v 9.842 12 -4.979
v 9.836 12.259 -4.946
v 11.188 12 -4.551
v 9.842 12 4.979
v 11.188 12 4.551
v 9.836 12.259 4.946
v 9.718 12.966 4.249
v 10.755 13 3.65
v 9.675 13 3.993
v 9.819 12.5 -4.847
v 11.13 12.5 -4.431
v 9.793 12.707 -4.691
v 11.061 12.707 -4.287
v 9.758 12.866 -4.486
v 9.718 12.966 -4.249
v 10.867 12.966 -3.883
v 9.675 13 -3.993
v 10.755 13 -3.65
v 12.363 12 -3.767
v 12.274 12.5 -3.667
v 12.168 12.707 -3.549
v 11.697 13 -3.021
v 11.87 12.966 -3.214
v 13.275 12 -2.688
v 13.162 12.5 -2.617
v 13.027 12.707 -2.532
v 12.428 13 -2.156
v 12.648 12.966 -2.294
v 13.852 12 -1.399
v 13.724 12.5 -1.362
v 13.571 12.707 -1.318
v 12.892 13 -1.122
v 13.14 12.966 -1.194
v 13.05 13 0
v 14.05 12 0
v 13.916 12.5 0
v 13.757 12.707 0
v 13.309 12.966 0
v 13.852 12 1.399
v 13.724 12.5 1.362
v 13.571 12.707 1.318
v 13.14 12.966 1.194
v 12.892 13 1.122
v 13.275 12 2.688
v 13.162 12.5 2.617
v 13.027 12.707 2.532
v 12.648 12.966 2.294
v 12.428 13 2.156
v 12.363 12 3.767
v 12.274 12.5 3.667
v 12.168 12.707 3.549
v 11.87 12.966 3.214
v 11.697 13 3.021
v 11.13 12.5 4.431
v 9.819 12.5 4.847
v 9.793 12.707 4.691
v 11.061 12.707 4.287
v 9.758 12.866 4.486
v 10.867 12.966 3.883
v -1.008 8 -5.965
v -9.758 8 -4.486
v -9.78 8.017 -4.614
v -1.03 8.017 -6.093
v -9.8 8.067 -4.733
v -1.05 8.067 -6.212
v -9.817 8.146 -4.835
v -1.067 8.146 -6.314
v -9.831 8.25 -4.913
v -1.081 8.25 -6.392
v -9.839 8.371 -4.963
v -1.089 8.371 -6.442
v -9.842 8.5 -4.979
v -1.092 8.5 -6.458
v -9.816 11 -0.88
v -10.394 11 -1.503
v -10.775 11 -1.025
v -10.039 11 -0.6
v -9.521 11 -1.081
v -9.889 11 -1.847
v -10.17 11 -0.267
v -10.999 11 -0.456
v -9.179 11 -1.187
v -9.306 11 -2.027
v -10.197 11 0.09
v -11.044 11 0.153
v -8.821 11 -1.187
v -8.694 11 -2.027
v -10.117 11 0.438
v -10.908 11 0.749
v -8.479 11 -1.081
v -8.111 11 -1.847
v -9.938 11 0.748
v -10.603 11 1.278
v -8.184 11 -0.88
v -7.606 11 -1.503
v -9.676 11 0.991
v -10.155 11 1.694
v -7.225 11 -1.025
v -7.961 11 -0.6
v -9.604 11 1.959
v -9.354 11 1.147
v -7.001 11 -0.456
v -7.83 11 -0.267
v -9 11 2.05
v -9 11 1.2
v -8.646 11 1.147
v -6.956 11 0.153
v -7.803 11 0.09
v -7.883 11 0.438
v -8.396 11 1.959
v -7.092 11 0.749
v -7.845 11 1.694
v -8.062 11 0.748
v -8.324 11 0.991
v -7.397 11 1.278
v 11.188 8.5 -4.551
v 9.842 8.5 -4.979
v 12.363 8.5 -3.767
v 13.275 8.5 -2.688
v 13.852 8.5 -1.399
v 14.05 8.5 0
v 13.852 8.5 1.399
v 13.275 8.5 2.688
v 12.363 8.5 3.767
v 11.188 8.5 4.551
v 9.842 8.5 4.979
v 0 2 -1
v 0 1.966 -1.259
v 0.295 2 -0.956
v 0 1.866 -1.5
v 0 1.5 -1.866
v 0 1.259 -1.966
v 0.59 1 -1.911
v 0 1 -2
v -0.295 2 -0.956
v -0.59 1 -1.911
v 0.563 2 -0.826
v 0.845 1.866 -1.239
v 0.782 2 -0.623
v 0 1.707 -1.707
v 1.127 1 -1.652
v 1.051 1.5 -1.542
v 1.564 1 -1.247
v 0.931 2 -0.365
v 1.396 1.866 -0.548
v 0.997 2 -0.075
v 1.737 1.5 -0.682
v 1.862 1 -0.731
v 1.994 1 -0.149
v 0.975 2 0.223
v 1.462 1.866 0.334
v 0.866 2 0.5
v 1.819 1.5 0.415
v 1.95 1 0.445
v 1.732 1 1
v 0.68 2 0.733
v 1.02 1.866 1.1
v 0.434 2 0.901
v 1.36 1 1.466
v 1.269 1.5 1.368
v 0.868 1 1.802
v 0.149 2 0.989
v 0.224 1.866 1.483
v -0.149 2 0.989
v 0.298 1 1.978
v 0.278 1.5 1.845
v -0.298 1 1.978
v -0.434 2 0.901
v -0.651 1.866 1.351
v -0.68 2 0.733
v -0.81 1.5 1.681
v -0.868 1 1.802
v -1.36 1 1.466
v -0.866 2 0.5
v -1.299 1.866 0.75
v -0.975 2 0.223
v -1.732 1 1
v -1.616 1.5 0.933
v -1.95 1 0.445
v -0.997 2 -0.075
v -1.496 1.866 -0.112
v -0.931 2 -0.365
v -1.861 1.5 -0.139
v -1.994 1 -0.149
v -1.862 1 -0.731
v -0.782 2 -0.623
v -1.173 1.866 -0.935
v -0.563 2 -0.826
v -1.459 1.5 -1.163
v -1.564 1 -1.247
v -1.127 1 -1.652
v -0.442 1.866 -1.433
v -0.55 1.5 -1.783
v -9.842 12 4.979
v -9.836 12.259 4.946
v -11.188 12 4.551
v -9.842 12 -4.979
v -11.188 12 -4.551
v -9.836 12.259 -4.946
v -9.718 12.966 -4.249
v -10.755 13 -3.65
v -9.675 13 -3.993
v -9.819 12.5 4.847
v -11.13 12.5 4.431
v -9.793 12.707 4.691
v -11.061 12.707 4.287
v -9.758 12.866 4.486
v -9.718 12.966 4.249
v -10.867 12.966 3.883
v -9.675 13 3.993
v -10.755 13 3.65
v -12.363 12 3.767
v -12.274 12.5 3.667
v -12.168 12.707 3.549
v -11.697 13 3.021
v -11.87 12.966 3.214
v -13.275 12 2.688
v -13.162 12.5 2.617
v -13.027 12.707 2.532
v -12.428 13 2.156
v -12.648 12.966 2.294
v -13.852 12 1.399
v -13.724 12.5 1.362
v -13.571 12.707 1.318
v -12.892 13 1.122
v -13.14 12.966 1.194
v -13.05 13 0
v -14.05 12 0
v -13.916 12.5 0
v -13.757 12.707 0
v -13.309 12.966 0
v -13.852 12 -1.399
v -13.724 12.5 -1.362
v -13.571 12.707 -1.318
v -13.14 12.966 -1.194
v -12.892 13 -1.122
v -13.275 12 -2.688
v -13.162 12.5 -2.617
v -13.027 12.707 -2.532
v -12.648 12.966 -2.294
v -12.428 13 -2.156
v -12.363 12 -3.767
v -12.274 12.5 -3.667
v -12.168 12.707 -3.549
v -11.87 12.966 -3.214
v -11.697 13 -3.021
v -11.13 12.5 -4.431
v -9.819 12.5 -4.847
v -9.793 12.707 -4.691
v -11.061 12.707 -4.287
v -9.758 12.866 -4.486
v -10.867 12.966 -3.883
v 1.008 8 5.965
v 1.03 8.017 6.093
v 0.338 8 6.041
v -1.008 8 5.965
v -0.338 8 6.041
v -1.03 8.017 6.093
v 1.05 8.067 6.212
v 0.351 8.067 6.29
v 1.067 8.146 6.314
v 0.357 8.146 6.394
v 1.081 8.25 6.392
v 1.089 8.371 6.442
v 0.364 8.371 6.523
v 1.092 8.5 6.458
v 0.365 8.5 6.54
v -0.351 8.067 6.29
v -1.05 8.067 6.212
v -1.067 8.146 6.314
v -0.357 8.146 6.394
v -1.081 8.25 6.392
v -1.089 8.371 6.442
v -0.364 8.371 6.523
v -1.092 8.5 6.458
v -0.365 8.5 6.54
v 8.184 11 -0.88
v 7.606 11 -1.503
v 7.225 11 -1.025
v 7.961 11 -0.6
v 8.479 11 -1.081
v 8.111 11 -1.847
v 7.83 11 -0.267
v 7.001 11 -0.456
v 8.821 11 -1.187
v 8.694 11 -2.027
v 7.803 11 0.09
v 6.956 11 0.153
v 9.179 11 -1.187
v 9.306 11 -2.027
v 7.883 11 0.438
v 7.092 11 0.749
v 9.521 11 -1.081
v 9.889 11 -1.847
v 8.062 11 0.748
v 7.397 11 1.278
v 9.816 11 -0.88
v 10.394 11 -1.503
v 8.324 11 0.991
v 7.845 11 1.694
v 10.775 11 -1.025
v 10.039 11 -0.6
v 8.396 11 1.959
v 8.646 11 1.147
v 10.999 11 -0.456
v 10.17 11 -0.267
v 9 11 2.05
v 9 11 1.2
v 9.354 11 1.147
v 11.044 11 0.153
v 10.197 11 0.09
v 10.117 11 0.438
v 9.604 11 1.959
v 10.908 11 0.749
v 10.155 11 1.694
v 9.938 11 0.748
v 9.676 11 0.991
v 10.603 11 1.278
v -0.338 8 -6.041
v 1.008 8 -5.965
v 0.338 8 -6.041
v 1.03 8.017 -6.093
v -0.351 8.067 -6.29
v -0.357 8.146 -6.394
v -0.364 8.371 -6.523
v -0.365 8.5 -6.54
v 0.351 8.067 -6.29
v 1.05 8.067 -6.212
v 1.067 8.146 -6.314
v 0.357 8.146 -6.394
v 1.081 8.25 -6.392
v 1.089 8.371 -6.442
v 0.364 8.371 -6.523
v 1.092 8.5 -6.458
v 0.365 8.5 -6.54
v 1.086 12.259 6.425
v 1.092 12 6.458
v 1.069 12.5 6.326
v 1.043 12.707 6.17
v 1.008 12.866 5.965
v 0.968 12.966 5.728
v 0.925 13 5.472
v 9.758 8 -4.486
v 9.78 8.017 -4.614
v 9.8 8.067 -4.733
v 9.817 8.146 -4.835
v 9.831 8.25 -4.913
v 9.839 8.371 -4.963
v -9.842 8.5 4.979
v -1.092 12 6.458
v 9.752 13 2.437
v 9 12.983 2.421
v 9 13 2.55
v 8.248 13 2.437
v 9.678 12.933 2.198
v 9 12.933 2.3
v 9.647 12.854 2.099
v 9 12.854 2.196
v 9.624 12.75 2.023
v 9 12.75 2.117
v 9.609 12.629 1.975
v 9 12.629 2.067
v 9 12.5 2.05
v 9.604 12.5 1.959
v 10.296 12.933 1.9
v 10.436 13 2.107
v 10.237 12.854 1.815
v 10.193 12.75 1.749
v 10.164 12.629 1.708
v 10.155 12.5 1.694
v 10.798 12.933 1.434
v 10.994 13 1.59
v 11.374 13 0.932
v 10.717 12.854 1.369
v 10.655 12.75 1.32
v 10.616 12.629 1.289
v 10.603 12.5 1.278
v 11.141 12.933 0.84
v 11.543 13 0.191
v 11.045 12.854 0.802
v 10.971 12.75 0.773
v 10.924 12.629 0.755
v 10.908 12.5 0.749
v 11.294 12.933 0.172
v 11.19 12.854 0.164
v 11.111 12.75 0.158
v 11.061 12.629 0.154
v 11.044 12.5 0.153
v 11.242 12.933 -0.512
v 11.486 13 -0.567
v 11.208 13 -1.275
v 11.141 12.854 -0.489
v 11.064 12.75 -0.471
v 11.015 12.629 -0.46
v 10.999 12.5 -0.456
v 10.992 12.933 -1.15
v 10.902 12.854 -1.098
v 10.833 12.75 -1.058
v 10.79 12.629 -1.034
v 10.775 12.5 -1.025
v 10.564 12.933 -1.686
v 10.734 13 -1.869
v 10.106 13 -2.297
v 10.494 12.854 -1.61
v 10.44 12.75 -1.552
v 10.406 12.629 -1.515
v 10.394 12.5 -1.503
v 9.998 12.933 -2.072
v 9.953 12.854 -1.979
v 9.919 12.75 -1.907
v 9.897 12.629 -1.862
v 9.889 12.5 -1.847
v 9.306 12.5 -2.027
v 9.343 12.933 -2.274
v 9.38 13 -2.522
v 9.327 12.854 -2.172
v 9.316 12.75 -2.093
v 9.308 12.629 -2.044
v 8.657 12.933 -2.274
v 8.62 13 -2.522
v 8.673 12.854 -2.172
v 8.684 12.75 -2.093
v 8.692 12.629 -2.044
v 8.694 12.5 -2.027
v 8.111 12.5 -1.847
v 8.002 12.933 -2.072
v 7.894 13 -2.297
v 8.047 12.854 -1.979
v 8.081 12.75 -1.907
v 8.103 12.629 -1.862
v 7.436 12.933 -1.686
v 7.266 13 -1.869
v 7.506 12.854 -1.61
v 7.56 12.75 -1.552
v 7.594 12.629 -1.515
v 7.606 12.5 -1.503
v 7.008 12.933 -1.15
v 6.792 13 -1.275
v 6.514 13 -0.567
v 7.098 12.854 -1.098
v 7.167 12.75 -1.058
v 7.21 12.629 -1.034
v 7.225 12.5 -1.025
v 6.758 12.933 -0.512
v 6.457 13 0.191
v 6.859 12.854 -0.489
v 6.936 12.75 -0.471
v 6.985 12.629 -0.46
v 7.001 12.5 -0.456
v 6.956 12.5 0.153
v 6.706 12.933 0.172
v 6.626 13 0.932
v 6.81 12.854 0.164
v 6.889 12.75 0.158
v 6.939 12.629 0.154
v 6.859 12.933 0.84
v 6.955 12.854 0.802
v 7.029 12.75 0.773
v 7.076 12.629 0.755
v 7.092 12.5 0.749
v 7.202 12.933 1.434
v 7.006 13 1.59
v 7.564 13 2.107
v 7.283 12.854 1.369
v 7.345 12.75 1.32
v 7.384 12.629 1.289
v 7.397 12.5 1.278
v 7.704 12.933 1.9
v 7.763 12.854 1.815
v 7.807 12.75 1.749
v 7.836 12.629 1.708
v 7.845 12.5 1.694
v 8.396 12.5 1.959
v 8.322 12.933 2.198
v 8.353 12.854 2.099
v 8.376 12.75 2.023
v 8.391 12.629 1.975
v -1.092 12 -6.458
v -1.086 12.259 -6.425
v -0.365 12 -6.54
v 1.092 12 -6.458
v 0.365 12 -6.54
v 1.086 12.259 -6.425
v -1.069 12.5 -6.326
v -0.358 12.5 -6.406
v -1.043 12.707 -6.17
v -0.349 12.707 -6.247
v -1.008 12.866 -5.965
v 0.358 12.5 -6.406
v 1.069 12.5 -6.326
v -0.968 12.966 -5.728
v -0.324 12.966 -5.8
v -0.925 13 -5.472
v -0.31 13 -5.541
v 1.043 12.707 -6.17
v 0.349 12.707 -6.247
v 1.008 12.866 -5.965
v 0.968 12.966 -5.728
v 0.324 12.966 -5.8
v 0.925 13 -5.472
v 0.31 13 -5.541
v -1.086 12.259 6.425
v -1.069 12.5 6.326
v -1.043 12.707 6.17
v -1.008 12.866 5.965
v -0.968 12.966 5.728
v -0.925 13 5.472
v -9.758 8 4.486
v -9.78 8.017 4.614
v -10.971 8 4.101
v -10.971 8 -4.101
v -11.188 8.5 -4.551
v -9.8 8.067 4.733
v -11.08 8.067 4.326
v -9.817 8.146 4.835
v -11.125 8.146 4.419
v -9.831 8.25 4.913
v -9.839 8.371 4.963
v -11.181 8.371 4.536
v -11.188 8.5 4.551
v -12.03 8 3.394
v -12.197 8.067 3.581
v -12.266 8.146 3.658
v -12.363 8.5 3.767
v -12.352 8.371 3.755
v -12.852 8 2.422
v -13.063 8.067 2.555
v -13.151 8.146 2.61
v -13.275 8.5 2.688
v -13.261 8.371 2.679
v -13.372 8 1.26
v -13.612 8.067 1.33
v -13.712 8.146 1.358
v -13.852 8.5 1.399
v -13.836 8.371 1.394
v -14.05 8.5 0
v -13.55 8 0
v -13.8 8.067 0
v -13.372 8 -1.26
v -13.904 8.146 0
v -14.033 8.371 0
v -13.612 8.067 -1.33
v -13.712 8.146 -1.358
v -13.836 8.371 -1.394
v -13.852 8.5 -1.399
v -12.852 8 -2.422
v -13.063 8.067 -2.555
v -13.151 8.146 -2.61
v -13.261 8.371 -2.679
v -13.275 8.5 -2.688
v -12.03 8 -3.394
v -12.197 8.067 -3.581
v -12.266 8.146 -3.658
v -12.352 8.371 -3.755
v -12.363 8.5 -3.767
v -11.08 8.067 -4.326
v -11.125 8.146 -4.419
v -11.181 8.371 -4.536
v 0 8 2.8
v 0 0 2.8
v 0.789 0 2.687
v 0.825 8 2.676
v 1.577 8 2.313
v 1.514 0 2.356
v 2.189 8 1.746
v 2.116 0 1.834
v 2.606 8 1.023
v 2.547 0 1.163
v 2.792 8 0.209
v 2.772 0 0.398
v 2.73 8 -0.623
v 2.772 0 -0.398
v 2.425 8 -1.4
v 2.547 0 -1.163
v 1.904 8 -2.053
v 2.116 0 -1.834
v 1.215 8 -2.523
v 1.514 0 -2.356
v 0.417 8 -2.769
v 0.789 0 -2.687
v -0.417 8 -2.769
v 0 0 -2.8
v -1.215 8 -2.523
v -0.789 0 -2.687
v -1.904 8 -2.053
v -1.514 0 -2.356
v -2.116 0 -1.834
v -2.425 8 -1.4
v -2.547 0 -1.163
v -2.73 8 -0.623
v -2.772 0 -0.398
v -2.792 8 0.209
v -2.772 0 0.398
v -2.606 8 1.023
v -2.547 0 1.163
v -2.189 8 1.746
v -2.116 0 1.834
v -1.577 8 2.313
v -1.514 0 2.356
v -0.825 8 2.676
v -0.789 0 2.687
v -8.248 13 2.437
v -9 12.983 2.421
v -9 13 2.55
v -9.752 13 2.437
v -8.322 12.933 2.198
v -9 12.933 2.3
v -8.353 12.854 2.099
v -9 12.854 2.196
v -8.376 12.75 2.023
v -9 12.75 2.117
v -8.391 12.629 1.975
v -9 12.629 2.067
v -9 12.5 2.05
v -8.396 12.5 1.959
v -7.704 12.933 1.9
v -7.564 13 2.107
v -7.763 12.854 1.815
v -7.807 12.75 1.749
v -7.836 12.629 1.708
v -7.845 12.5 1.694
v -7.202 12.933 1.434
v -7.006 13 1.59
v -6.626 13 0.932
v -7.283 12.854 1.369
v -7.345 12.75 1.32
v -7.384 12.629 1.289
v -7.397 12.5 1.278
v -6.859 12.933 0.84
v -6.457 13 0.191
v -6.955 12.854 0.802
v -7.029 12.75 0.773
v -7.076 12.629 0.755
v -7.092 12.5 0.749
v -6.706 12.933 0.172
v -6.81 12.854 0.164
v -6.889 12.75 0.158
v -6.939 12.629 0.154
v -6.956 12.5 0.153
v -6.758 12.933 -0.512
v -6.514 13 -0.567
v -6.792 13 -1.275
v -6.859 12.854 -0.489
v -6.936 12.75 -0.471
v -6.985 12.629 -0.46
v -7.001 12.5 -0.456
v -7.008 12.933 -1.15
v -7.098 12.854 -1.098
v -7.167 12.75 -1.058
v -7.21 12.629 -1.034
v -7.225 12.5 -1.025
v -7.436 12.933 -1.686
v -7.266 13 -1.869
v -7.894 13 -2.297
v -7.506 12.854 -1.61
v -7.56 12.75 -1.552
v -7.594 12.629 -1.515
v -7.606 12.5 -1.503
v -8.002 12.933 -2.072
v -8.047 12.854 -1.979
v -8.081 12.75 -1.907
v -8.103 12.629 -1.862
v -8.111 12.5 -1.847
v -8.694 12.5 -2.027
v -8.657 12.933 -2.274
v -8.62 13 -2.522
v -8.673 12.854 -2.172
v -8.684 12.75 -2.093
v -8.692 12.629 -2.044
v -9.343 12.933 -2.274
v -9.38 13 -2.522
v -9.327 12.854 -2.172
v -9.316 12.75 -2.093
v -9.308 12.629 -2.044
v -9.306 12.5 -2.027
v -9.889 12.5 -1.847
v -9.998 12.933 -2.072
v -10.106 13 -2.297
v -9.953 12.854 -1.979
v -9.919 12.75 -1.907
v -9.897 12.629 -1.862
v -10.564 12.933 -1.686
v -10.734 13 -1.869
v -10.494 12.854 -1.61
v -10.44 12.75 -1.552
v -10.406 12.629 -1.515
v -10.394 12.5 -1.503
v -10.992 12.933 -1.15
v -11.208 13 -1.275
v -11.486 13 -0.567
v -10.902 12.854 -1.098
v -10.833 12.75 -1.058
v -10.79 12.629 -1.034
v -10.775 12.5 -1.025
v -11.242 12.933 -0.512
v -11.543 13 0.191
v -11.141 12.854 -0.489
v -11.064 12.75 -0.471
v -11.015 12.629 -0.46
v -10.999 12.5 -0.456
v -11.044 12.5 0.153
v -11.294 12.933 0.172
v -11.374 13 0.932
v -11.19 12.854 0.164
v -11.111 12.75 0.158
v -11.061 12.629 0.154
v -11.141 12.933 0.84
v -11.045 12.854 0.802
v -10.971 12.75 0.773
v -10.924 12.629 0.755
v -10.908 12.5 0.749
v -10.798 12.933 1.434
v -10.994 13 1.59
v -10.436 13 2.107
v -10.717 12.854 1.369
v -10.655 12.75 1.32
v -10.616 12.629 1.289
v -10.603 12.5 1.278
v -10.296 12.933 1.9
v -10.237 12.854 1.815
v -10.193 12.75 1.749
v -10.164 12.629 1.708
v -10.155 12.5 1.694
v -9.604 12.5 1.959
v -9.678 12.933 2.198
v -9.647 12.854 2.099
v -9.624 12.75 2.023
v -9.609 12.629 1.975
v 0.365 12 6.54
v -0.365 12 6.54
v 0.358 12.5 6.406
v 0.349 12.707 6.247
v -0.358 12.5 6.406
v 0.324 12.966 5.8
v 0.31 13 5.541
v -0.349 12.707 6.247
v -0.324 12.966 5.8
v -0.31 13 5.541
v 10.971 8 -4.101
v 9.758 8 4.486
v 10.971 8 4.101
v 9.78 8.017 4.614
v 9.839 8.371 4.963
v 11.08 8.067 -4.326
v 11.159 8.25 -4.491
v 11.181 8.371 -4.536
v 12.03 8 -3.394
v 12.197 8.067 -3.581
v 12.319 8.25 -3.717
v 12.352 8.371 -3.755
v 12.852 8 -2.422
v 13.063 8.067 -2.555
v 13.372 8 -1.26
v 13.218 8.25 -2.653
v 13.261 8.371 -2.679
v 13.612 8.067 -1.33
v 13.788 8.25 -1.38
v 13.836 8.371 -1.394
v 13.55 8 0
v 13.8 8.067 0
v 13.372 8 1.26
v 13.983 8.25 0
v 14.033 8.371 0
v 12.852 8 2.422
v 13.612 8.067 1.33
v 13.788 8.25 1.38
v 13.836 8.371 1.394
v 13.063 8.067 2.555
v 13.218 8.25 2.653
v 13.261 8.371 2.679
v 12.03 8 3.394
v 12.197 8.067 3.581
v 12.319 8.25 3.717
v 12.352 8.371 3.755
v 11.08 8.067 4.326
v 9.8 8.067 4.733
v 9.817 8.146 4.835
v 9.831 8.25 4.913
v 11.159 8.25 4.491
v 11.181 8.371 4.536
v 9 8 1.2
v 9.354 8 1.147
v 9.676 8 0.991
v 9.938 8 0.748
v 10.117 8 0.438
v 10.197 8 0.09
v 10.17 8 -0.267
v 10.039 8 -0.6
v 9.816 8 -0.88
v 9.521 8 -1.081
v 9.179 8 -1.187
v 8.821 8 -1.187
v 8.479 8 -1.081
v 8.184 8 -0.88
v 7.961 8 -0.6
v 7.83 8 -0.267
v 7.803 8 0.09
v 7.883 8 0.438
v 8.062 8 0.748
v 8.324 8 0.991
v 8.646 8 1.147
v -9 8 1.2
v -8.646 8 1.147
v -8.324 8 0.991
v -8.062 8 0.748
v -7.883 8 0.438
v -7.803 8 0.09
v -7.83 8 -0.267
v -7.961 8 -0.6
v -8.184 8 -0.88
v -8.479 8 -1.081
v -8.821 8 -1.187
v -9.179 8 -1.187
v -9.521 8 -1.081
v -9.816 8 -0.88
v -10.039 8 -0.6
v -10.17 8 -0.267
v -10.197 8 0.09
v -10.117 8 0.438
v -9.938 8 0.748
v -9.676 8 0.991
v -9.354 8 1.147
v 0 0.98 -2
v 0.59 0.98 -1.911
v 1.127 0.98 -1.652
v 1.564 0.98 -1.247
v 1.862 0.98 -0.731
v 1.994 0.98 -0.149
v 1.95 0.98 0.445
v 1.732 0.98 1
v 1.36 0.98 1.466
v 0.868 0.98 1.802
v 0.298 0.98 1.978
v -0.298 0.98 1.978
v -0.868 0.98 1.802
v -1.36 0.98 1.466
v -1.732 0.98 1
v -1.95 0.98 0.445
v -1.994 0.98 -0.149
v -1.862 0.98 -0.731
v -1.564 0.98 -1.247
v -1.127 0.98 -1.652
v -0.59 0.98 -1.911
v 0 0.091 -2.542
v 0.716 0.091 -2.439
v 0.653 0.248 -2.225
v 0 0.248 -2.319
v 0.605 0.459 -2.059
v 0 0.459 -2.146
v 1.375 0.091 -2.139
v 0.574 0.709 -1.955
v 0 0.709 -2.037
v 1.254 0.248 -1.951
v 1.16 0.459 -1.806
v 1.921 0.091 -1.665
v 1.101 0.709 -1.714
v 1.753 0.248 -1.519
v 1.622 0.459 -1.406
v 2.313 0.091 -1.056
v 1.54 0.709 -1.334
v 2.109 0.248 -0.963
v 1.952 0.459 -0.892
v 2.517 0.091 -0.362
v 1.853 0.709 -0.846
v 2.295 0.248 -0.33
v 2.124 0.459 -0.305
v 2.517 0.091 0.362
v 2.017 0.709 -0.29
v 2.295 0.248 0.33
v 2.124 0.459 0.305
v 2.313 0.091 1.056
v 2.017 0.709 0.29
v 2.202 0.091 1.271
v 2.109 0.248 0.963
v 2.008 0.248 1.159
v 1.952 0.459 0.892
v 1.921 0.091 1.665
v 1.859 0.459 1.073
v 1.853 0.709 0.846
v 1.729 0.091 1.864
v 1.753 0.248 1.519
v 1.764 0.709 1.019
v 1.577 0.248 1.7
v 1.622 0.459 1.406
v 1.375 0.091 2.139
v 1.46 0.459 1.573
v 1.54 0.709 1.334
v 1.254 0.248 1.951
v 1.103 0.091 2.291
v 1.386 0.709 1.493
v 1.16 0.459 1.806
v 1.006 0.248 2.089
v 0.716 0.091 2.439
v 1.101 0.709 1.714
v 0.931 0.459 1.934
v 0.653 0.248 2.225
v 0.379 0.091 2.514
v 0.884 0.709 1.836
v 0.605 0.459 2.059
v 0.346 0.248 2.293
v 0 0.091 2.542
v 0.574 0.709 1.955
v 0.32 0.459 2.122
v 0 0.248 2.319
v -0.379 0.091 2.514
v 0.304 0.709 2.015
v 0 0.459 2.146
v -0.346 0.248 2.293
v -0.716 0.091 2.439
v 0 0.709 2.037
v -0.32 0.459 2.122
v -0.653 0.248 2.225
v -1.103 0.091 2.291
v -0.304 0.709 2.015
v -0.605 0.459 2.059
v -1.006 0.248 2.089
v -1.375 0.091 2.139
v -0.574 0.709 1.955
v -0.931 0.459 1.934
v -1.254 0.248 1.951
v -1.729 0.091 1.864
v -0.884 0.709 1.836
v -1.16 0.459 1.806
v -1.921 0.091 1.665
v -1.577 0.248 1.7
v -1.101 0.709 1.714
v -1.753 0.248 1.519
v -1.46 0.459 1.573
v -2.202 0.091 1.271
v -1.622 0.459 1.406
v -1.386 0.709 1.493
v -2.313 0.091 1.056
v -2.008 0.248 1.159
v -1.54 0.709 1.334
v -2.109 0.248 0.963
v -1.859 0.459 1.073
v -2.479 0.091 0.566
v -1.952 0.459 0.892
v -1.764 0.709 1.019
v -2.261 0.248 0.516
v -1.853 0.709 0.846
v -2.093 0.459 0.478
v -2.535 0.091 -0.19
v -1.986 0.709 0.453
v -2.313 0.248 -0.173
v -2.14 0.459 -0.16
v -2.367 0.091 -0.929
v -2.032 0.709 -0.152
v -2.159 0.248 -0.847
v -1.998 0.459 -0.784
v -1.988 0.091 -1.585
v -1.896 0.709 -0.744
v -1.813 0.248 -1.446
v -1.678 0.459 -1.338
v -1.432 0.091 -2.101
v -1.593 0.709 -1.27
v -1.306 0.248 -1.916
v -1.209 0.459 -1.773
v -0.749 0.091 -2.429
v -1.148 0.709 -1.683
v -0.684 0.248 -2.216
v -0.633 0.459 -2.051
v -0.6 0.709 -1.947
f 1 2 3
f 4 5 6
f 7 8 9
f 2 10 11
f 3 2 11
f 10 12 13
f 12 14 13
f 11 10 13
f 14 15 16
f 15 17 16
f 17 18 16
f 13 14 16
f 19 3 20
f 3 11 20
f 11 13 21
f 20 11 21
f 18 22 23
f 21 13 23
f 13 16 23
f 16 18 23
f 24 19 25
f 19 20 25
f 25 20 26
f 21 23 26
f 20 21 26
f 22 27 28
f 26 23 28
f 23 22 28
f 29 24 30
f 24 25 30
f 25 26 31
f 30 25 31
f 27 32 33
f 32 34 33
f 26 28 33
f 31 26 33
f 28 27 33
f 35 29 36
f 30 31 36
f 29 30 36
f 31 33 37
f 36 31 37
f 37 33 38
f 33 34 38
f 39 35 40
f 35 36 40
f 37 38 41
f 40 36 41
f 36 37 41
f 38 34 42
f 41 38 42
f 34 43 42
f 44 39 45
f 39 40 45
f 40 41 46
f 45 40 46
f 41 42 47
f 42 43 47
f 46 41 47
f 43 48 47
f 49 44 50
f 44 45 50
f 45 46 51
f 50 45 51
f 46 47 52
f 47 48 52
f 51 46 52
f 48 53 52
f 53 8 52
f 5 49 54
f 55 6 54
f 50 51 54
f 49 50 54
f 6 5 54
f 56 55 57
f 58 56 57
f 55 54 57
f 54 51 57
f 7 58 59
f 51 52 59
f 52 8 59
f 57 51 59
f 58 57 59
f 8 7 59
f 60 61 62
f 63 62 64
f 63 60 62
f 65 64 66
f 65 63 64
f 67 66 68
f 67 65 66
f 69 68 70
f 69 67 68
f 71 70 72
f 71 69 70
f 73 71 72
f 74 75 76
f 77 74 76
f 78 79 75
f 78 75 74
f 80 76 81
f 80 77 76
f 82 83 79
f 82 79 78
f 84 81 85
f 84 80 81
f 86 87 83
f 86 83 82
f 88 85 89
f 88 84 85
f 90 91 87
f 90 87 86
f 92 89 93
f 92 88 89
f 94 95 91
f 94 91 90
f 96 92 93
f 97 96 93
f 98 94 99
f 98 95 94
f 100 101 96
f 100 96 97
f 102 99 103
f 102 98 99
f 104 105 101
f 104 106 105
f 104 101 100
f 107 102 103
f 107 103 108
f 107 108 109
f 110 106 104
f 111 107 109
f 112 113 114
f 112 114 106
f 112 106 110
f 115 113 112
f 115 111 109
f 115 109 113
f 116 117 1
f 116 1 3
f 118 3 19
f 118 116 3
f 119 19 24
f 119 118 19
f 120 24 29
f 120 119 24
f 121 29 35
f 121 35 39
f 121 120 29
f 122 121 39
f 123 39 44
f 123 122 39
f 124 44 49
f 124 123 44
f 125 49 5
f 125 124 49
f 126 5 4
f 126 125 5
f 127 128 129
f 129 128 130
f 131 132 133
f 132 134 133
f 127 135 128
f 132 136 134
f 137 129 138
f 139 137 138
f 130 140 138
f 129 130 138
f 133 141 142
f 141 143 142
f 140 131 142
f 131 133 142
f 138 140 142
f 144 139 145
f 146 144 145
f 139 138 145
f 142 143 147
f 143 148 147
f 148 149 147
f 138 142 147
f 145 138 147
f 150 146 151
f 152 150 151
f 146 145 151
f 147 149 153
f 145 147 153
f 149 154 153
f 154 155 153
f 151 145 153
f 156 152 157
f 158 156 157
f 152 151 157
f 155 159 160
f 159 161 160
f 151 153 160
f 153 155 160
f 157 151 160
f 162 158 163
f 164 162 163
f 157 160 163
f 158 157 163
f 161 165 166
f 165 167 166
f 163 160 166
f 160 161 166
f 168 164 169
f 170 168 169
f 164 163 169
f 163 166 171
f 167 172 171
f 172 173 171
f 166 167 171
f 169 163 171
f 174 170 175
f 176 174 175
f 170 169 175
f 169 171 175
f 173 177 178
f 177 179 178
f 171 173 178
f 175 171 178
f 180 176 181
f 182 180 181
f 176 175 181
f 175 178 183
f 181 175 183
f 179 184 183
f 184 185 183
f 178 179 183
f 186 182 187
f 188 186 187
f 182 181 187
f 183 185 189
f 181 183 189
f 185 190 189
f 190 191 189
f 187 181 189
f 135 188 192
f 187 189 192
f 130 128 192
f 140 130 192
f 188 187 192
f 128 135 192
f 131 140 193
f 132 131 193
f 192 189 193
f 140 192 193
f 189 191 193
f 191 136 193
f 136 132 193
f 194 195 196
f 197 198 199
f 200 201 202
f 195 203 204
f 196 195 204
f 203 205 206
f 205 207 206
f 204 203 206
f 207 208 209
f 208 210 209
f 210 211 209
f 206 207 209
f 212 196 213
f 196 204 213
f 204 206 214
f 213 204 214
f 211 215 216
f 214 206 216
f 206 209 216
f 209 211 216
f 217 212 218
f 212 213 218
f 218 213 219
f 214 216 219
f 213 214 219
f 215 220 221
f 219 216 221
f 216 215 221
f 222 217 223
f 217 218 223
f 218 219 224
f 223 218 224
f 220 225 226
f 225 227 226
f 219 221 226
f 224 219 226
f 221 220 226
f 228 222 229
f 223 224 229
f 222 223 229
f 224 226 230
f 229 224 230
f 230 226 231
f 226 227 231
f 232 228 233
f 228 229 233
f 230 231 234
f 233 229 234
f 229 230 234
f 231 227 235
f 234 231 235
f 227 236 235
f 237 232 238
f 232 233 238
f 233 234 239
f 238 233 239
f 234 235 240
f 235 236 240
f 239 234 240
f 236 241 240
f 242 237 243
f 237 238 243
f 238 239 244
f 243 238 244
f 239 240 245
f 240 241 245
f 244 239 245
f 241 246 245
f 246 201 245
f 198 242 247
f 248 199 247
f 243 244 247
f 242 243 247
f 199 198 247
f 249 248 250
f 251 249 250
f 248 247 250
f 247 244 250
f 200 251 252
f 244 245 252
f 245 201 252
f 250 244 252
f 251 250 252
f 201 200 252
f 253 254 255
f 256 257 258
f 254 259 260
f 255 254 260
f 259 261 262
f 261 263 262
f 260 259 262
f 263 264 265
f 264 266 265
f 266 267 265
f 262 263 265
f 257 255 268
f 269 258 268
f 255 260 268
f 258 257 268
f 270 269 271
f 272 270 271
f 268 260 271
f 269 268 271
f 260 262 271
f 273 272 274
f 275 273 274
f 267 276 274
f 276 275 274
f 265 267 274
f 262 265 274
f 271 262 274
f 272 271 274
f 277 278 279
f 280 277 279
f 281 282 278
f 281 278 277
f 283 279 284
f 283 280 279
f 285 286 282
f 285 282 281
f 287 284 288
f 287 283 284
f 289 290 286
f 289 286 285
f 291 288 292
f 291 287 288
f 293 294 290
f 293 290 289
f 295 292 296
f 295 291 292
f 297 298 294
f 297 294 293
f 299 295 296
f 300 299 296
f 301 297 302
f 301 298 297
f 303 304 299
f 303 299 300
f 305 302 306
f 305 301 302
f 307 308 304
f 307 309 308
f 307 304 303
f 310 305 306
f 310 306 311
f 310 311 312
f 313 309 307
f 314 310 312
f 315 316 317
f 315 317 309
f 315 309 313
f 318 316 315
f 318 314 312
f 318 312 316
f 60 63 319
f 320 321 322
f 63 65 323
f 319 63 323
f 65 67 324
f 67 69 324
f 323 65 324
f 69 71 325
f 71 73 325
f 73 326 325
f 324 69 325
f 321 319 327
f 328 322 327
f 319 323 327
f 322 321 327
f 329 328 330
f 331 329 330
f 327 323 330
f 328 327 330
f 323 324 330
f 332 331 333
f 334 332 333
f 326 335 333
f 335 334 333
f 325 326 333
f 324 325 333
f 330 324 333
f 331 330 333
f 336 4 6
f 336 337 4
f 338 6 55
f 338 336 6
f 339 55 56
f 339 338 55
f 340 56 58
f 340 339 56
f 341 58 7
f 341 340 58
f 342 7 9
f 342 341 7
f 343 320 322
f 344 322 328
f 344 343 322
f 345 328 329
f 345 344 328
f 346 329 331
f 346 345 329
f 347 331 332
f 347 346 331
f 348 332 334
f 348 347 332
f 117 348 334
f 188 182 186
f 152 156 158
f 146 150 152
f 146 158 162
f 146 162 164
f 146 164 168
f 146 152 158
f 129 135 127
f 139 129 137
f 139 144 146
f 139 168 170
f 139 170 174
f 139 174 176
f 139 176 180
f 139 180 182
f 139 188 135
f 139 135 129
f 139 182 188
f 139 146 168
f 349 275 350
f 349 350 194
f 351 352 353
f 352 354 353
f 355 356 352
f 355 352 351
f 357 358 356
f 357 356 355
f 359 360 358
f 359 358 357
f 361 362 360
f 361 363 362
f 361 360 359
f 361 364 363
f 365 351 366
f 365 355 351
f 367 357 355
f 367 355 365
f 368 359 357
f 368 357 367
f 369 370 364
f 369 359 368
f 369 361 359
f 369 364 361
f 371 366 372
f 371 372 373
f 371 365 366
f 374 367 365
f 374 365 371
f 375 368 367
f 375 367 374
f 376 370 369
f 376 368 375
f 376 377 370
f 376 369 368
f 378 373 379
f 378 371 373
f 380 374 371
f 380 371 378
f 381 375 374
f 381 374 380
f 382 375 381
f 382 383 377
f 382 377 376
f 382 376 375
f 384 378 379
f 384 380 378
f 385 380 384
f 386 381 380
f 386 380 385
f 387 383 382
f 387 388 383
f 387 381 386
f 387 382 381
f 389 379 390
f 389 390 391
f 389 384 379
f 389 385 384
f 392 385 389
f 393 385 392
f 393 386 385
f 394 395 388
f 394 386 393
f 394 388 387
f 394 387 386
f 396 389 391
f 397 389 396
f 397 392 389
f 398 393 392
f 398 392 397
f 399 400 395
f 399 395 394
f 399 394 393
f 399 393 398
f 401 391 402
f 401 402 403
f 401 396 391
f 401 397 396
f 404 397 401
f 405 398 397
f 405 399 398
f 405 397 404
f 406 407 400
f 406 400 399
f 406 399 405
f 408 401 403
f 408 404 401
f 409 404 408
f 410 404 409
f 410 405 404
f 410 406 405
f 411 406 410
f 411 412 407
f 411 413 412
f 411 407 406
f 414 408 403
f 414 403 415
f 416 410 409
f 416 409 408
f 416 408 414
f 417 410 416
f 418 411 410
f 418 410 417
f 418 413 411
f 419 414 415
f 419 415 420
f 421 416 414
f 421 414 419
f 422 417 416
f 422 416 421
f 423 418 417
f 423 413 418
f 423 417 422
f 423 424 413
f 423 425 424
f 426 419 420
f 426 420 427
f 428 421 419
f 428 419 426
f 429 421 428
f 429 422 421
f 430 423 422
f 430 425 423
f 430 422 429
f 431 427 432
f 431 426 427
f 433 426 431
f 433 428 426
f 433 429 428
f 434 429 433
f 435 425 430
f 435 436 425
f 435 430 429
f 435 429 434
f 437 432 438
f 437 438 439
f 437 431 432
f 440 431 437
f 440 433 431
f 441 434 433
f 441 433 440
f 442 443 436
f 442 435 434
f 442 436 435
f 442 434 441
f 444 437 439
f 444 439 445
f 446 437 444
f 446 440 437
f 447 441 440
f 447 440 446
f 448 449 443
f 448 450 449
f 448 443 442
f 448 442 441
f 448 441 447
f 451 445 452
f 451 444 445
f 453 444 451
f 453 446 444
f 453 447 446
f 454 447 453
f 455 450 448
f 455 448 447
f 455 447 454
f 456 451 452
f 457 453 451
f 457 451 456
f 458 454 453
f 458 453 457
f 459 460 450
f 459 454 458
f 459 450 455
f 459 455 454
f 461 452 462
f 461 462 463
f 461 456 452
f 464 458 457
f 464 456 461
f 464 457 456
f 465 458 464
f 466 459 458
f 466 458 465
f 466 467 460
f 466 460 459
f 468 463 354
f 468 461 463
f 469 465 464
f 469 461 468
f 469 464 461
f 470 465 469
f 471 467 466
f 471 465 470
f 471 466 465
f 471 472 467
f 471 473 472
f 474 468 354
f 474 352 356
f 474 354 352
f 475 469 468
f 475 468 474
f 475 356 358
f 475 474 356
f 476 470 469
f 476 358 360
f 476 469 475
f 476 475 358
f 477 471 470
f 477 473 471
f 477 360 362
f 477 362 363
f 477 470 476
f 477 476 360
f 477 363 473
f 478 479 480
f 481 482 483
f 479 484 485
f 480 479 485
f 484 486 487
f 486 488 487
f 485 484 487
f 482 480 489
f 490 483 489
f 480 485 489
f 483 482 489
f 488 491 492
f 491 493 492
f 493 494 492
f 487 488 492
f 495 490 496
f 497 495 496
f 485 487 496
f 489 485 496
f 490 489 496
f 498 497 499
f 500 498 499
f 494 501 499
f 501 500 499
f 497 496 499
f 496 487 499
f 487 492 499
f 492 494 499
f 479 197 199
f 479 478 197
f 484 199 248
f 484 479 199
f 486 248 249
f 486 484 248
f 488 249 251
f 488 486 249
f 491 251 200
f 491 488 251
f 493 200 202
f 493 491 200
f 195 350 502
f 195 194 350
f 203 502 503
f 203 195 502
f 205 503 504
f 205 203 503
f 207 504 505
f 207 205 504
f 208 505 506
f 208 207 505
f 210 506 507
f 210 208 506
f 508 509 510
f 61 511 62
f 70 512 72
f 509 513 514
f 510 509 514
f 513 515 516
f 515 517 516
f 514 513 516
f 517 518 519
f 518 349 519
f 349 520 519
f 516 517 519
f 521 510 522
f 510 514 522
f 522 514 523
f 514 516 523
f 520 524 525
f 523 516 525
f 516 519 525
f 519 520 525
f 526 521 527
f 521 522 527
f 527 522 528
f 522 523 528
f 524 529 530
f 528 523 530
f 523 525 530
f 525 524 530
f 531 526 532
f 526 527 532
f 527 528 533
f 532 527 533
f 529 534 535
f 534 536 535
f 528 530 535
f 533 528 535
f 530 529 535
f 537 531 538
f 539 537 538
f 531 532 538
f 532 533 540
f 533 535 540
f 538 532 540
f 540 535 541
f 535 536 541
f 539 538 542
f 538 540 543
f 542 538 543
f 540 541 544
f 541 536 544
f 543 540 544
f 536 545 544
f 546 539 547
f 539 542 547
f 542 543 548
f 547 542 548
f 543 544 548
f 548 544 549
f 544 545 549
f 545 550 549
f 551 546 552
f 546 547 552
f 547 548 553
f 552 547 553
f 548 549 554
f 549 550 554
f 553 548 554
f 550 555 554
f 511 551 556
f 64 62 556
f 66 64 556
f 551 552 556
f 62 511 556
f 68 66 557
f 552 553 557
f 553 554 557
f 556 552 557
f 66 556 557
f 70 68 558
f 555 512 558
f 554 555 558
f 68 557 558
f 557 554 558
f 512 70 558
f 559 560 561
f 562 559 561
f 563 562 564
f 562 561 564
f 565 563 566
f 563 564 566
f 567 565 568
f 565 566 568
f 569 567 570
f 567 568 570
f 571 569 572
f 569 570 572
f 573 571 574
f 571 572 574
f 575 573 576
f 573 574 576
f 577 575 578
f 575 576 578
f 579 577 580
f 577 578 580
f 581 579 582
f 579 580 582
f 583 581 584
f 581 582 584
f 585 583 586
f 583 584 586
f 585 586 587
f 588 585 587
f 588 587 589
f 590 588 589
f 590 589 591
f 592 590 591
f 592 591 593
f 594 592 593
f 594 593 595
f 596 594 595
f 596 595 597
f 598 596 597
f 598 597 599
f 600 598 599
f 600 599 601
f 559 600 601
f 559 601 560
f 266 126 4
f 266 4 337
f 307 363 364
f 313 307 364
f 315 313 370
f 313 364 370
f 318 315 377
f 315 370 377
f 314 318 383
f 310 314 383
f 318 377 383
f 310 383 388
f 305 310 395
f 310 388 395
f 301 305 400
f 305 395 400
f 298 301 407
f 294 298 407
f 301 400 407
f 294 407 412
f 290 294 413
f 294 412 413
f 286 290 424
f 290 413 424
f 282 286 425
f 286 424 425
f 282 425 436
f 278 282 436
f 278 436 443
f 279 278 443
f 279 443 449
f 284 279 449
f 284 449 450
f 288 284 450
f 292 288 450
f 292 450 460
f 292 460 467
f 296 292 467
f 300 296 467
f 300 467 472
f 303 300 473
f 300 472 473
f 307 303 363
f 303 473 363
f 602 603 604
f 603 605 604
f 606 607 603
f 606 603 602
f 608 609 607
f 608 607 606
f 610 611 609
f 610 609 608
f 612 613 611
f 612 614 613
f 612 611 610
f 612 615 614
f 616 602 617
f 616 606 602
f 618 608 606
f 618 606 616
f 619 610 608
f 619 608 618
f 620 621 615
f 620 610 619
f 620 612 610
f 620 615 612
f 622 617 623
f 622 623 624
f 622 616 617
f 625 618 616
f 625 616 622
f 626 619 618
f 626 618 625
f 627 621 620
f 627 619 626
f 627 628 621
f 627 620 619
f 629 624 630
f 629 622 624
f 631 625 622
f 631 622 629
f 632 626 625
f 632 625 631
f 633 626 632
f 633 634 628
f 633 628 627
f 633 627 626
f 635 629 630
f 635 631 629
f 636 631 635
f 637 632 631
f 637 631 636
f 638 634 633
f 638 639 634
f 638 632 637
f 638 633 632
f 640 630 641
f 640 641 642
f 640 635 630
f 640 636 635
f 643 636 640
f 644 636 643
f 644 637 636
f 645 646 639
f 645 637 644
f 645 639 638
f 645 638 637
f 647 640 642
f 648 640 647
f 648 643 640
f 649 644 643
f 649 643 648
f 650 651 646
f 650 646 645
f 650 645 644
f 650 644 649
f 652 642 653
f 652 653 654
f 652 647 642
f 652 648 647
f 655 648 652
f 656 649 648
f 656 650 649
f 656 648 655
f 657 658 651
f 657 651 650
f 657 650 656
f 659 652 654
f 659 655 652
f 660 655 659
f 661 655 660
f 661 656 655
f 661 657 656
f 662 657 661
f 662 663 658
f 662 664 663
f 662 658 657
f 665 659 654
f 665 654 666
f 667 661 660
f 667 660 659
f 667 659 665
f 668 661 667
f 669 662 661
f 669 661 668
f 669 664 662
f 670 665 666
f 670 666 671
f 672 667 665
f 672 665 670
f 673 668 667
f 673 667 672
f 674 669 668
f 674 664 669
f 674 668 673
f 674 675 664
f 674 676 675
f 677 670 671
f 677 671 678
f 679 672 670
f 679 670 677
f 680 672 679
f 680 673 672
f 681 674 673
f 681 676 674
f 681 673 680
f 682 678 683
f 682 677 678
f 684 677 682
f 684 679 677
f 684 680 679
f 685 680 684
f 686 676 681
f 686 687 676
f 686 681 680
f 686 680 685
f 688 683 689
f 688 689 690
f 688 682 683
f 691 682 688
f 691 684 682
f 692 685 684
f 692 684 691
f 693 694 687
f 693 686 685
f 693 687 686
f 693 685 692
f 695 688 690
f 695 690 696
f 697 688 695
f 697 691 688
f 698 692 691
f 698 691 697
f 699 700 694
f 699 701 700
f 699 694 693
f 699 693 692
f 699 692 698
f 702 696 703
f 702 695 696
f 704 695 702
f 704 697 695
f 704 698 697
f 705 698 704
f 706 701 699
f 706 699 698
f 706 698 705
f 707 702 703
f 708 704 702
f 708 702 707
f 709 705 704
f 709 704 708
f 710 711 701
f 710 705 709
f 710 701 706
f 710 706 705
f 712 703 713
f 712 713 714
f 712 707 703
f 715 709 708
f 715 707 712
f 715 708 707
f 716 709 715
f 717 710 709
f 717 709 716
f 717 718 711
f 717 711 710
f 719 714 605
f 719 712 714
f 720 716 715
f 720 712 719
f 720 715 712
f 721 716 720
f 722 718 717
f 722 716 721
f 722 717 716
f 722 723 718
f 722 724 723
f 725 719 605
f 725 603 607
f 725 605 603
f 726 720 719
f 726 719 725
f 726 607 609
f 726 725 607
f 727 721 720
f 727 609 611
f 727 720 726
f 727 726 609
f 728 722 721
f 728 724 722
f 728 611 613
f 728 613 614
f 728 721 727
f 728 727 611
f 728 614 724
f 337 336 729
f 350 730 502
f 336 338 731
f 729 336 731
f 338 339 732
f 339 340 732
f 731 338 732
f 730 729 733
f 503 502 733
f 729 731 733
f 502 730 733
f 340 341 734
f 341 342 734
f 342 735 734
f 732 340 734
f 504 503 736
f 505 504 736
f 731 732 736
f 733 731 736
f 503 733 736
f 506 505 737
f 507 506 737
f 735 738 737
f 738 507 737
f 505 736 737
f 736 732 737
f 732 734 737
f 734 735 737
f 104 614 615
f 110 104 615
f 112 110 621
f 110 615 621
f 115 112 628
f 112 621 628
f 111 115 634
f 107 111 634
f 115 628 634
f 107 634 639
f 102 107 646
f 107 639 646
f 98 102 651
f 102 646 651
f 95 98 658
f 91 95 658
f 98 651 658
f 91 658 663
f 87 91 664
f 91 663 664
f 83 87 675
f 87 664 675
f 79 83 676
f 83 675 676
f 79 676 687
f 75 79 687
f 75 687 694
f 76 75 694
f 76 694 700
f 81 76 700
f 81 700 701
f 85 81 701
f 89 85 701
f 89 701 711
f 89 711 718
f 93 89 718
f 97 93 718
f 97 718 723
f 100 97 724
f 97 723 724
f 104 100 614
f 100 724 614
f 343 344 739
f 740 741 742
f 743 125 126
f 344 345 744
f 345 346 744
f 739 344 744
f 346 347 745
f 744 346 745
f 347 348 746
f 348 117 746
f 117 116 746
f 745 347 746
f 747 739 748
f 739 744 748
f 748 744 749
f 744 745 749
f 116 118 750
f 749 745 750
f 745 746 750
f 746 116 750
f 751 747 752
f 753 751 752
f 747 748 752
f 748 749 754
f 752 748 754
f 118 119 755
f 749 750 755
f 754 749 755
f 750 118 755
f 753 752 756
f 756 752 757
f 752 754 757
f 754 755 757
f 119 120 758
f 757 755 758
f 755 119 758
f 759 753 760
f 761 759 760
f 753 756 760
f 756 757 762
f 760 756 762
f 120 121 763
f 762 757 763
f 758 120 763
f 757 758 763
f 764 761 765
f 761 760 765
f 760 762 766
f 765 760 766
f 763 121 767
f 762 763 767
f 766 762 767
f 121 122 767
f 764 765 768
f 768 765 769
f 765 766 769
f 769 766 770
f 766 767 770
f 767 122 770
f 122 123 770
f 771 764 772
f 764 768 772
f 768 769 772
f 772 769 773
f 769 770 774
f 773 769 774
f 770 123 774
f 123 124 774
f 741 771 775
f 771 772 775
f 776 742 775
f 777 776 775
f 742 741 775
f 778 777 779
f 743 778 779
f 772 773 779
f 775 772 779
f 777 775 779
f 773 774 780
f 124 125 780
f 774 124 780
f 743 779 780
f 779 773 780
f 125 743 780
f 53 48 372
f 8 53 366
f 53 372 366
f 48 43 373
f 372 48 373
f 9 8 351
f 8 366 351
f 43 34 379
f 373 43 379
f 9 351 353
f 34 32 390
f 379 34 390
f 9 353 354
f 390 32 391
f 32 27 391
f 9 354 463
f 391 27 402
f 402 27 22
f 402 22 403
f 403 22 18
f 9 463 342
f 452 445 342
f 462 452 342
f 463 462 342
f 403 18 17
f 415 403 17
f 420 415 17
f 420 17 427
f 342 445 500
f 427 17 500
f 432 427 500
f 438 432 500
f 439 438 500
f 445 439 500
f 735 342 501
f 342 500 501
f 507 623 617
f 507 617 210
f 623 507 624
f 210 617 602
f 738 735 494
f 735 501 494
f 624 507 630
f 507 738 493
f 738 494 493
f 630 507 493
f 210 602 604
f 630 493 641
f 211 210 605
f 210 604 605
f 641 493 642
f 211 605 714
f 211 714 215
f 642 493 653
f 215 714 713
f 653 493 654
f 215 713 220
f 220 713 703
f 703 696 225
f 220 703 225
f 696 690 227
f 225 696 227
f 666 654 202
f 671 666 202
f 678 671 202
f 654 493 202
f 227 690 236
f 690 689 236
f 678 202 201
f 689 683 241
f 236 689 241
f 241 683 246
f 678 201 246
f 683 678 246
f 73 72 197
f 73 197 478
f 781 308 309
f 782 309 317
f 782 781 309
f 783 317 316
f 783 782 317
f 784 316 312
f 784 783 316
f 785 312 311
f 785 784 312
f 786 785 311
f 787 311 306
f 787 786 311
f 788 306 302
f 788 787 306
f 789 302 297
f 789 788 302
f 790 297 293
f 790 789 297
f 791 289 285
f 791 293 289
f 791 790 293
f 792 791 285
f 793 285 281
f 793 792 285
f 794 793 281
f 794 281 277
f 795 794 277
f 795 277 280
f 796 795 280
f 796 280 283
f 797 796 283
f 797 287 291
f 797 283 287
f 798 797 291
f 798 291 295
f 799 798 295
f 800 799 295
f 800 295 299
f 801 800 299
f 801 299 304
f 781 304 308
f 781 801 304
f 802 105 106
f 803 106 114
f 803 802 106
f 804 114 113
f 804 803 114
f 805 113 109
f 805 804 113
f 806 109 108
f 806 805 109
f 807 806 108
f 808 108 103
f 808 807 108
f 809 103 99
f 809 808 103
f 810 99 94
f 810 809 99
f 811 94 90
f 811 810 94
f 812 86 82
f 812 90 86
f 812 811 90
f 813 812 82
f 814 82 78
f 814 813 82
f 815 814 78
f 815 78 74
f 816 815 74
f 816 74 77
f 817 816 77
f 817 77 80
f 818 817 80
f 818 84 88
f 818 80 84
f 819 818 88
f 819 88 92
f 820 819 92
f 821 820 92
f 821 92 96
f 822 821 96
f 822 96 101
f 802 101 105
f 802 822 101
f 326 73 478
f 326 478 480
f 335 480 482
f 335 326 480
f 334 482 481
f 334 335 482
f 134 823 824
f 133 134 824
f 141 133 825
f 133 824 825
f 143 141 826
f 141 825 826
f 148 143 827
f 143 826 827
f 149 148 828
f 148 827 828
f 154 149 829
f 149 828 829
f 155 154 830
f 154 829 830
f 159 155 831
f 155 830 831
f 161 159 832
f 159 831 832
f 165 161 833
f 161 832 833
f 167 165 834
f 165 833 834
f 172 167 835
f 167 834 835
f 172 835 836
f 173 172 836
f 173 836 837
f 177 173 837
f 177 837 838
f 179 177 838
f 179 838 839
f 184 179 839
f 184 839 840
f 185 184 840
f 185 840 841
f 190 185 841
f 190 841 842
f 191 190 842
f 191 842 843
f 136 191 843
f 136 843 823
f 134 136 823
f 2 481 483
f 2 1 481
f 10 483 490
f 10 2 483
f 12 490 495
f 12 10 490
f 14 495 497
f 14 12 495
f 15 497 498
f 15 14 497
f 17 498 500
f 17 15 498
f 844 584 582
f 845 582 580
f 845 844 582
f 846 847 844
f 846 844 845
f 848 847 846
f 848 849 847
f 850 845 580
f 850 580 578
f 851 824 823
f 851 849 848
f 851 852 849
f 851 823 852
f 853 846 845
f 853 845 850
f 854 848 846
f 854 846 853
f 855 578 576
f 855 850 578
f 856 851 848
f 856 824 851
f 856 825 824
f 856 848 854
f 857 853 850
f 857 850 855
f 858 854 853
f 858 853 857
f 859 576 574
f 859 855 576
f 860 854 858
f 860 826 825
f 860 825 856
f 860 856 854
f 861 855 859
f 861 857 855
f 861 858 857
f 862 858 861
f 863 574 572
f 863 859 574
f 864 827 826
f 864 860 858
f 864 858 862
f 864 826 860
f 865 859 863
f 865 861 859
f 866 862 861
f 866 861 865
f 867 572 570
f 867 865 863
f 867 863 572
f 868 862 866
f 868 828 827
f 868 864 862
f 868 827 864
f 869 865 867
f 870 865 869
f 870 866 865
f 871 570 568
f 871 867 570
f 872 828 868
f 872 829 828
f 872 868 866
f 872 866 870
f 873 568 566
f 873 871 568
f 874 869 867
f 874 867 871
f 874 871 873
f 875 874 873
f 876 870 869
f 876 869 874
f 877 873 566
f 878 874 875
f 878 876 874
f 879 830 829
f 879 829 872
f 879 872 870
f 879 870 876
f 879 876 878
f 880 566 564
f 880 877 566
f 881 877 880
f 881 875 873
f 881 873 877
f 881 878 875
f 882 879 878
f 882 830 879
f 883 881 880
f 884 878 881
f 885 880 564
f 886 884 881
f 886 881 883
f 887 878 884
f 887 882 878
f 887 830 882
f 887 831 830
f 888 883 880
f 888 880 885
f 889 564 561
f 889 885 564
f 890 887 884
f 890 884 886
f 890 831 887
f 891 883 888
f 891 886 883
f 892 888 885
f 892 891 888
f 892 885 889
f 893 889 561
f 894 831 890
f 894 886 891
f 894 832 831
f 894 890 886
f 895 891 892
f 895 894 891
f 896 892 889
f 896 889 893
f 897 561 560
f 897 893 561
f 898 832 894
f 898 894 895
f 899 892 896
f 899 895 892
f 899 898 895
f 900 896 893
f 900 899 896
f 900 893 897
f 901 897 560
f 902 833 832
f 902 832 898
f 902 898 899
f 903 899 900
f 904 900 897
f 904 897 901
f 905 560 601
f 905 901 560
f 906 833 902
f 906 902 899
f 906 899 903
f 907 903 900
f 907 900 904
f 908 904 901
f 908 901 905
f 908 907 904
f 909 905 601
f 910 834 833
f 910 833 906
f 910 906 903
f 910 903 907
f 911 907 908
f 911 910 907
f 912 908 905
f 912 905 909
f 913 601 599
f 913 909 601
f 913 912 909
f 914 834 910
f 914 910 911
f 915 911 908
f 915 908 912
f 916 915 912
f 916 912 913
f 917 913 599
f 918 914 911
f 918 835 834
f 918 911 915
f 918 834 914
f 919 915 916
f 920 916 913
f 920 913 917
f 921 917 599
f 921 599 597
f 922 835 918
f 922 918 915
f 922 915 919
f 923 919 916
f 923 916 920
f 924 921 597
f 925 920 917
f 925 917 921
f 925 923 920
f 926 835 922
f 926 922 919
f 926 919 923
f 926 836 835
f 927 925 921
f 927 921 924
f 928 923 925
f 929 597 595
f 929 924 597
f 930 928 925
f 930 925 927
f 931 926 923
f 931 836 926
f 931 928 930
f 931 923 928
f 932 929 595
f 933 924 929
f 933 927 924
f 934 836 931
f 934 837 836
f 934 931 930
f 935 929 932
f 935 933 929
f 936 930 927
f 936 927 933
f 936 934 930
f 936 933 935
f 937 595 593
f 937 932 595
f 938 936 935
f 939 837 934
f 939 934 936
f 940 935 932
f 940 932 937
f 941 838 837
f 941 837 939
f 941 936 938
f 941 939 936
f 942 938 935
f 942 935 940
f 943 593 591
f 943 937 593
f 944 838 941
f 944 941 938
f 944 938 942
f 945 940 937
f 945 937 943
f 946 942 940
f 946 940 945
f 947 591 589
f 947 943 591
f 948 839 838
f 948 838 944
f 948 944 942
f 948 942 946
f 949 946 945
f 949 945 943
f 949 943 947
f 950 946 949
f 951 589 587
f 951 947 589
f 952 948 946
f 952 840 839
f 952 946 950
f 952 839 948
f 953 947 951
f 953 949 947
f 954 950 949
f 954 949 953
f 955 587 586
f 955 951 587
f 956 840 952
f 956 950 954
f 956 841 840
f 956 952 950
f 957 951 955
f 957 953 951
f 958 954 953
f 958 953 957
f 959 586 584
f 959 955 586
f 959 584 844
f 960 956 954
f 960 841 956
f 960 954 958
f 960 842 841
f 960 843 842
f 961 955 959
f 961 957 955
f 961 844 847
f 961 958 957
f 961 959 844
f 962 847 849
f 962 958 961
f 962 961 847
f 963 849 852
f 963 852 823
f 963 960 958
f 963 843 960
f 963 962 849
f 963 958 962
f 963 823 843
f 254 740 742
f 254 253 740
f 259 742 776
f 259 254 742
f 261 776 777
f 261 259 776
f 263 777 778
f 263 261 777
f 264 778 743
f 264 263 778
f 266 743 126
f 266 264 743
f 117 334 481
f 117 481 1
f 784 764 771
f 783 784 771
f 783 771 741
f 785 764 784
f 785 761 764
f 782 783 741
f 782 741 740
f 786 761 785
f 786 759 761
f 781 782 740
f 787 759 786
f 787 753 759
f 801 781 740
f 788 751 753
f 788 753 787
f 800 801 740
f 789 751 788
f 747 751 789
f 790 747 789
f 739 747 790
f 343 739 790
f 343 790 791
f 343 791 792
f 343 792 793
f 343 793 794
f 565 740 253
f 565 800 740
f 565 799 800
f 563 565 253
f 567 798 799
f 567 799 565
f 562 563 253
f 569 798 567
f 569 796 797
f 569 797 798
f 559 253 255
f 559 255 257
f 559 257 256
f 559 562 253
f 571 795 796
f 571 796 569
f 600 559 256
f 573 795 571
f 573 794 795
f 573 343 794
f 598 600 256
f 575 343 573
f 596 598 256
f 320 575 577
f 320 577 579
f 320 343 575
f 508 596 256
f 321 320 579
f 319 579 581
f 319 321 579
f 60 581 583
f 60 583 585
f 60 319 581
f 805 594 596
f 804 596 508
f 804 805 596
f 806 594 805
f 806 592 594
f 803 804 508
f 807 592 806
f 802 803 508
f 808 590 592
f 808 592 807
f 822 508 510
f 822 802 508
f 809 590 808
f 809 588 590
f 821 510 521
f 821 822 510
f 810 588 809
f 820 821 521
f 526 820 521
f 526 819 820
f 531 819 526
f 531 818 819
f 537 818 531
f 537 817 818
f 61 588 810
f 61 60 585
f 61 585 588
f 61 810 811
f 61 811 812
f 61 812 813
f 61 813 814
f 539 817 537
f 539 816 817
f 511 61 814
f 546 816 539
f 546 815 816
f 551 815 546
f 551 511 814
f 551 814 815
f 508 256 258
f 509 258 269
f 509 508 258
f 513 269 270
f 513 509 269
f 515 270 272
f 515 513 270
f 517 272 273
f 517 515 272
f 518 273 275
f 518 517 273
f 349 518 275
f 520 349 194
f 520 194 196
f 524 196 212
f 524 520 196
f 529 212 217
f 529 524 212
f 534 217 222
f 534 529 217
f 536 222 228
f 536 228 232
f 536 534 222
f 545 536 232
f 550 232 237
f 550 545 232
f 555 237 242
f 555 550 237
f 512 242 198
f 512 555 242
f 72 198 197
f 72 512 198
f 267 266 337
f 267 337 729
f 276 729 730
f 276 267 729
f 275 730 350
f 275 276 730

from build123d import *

# Parameters (mm, degrees)
SKETCH1_R           = 2.8
BOSS_EXTRUDE1_DEPTH = 8
SKETCH2_R           = 1.2
BOSS_EXTRUDE2_DEPTH = 5
SKETCH3_R           = 2.05
CUT_EXTRUDE1_DEPTH  = 2
FILLET1_R           = 0.5
FILLET2_R           = 1
SKETCH5_R           = 2
CUT_EXTRUDE2_DEPTH  = 2
FILLET3_R           = 1


with BuildPart() as part:
    # Sketch1 → Boss-Extrude1 (new body)
    with BuildSketch(Plane(origin=(0, 0, 0), x_dir=(1, 0, 0), z_dir=(0, 1, 0))):
        with Locations(Location((0, 0, 0), (0, 0, 270))):
            Circle(SKETCH1_R)
    extrude(amount=BOSS_EXTRUDE1_DEPTH)

    # Sketch2 → Boss-Extrude2 (add)
    with BuildSketch(Plane(origin=(0, 8, 0), x_dir=(1, 0, 0), z_dir=(0, 1, 0))):
        with BuildLine():
            Line((-9.841666667, 4.979367151), (-1.091666667, 6.458387097))
            ThreePointArc((-1.091666667, 6.458387097), (0, 6.55), (1.091666667, 6.458387097))
            Line((1.091666667, 6.458387097), (9.841666667, 4.979367151))
            ThreePointArc((9.841666667, 4.979367151), (14.05, 0), (9.841666667, -4.979367151))
            Line((9.841666667, -4.979367151), (1.091666667, -6.458387097))
            ThreePointArc((1.091666667, -6.458387097), (0, -6.55), (-1.091666667, -6.458387097))
            Line((-1.091666667, -6.458387097), (-9.841666667, -4.979367151))
            ThreePointArc((-9.841666667, -4.979367151), (-14.05, 0), (-9.841666667, 4.979367151))
        make_face()
        with Locations(Location((-9, 0, 0), (0, 0, 270))):
            Circle(SKETCH2_R, mode=Mode.SUBTRACT)
        with Locations(Location((9, 0, 0), (0, 0, 270))):
            Circle(SKETCH2_R, mode=Mode.SUBTRACT)
    extrude(amount=BOSS_EXTRUDE2_DEPTH)

    # Sketch3 → Cut-Extrude1 (cut)
    with BuildSketch(Plane(origin=(0, 13, 0), x_dir=(1, 0, 0), z_dir=(0, 1, 0))):
        with Locations(Location((-9, 0, 0), (0, 0, 270))):
            Circle(SKETCH3_R)
        with Locations(Location((9, 0, 0), (0, 0, 270))):
            Circle(SKETCH3_R)
    extrude(amount=-CUT_EXTRUDE1_DEPTH, mode=Mode.SUBTRACT)

    # Fillet1
    fillet1_edges = [part.edges().sort_by_distance(p)[0] for p in [
        (5.466666667, 8, 5.718877124),
        (14.05, 8, 0),
        (5.466666667, 8, -5.718877124),
        (0, 8, -6.55),
        (-5.466666667, 8, -5.718877124),
        (-9, 13, -2.05),
        (9, 13, -2.05),
        (-14.05, 8, 0),
        (-5.466666667, 8, 5.718877124),
        (0, 8, 6.55),
    ]]
    fillet(fillet1_edges, radius=FILLET1_R)

    # Fillet2
    fillet2_edges = [part.edges().sort_by_distance(p)[0] for p in [
        (-14.05, 13, 0),
        (-5.466666667, 13, 5.718877124),
        (0, 13, 6.55),
        (5.466666667, 13, 5.718877124),
        (14.05, 13, 0),
        (5.466666667, 13, -5.718877124),
        (0, 13, -6.55),
        (-5.466666667, 13, -5.718877124),
    ]]
    fillet(fillet2_edges, radius=FILLET2_R)

    # Sketch5 → Cut-Extrude2 (cut)
    with BuildSketch(Plane.XZ):
        with Locations(Location((0, 0, 0), (0, 0, 270))):
            Circle(SKETCH5_R)
    extrude(amount=-CUT_EXTRUDE2_DEPTH, mode=Mode.SUBTRACT)

    # Fillet3
    # the kernel refuses this fillet: 1 mm, written as the material it adds along each edge
    with BuildSketch(Plane(origin=(0, 2, 0), x_dir=(0, 0, -1), z_dir=(-1, 0, 0))) as fillet3_piece_1:
        with BuildLine():
            CenterArc((2 - FILLET3_R, FILLET3_R), FILLET3_R, 270, 90)
            Line((2 - FILLET3_R, 0), (2, 0))
            Line((2, 0), (2, FILLET3_R))
        make_face()
    revolve(axis=Axis((0, 2, 0), (0, -1, 0)))
    # the kernel refuses this fillet: 1 mm, written as the material it takes off along each edge
    with BuildSketch(Plane(origin=(0, 0, 0), x_dir=(0, 0, -1), z_dir=(-1, 0, 0))) as fillet3_2_piece_1:
        with BuildLine():
            CenterArc((3, -0.979795897), FILLET3_R, 101.536959033, 78.463040967)
            Line((2, -0.979795897), (2, 0))
            Line((2, 0), (2.8, 0))
        make_face()
    revolve(axis=Axis((0, 0, 0), (0, -1, 0)), mode=Mode.SUBTRACT)


solid = part.part
